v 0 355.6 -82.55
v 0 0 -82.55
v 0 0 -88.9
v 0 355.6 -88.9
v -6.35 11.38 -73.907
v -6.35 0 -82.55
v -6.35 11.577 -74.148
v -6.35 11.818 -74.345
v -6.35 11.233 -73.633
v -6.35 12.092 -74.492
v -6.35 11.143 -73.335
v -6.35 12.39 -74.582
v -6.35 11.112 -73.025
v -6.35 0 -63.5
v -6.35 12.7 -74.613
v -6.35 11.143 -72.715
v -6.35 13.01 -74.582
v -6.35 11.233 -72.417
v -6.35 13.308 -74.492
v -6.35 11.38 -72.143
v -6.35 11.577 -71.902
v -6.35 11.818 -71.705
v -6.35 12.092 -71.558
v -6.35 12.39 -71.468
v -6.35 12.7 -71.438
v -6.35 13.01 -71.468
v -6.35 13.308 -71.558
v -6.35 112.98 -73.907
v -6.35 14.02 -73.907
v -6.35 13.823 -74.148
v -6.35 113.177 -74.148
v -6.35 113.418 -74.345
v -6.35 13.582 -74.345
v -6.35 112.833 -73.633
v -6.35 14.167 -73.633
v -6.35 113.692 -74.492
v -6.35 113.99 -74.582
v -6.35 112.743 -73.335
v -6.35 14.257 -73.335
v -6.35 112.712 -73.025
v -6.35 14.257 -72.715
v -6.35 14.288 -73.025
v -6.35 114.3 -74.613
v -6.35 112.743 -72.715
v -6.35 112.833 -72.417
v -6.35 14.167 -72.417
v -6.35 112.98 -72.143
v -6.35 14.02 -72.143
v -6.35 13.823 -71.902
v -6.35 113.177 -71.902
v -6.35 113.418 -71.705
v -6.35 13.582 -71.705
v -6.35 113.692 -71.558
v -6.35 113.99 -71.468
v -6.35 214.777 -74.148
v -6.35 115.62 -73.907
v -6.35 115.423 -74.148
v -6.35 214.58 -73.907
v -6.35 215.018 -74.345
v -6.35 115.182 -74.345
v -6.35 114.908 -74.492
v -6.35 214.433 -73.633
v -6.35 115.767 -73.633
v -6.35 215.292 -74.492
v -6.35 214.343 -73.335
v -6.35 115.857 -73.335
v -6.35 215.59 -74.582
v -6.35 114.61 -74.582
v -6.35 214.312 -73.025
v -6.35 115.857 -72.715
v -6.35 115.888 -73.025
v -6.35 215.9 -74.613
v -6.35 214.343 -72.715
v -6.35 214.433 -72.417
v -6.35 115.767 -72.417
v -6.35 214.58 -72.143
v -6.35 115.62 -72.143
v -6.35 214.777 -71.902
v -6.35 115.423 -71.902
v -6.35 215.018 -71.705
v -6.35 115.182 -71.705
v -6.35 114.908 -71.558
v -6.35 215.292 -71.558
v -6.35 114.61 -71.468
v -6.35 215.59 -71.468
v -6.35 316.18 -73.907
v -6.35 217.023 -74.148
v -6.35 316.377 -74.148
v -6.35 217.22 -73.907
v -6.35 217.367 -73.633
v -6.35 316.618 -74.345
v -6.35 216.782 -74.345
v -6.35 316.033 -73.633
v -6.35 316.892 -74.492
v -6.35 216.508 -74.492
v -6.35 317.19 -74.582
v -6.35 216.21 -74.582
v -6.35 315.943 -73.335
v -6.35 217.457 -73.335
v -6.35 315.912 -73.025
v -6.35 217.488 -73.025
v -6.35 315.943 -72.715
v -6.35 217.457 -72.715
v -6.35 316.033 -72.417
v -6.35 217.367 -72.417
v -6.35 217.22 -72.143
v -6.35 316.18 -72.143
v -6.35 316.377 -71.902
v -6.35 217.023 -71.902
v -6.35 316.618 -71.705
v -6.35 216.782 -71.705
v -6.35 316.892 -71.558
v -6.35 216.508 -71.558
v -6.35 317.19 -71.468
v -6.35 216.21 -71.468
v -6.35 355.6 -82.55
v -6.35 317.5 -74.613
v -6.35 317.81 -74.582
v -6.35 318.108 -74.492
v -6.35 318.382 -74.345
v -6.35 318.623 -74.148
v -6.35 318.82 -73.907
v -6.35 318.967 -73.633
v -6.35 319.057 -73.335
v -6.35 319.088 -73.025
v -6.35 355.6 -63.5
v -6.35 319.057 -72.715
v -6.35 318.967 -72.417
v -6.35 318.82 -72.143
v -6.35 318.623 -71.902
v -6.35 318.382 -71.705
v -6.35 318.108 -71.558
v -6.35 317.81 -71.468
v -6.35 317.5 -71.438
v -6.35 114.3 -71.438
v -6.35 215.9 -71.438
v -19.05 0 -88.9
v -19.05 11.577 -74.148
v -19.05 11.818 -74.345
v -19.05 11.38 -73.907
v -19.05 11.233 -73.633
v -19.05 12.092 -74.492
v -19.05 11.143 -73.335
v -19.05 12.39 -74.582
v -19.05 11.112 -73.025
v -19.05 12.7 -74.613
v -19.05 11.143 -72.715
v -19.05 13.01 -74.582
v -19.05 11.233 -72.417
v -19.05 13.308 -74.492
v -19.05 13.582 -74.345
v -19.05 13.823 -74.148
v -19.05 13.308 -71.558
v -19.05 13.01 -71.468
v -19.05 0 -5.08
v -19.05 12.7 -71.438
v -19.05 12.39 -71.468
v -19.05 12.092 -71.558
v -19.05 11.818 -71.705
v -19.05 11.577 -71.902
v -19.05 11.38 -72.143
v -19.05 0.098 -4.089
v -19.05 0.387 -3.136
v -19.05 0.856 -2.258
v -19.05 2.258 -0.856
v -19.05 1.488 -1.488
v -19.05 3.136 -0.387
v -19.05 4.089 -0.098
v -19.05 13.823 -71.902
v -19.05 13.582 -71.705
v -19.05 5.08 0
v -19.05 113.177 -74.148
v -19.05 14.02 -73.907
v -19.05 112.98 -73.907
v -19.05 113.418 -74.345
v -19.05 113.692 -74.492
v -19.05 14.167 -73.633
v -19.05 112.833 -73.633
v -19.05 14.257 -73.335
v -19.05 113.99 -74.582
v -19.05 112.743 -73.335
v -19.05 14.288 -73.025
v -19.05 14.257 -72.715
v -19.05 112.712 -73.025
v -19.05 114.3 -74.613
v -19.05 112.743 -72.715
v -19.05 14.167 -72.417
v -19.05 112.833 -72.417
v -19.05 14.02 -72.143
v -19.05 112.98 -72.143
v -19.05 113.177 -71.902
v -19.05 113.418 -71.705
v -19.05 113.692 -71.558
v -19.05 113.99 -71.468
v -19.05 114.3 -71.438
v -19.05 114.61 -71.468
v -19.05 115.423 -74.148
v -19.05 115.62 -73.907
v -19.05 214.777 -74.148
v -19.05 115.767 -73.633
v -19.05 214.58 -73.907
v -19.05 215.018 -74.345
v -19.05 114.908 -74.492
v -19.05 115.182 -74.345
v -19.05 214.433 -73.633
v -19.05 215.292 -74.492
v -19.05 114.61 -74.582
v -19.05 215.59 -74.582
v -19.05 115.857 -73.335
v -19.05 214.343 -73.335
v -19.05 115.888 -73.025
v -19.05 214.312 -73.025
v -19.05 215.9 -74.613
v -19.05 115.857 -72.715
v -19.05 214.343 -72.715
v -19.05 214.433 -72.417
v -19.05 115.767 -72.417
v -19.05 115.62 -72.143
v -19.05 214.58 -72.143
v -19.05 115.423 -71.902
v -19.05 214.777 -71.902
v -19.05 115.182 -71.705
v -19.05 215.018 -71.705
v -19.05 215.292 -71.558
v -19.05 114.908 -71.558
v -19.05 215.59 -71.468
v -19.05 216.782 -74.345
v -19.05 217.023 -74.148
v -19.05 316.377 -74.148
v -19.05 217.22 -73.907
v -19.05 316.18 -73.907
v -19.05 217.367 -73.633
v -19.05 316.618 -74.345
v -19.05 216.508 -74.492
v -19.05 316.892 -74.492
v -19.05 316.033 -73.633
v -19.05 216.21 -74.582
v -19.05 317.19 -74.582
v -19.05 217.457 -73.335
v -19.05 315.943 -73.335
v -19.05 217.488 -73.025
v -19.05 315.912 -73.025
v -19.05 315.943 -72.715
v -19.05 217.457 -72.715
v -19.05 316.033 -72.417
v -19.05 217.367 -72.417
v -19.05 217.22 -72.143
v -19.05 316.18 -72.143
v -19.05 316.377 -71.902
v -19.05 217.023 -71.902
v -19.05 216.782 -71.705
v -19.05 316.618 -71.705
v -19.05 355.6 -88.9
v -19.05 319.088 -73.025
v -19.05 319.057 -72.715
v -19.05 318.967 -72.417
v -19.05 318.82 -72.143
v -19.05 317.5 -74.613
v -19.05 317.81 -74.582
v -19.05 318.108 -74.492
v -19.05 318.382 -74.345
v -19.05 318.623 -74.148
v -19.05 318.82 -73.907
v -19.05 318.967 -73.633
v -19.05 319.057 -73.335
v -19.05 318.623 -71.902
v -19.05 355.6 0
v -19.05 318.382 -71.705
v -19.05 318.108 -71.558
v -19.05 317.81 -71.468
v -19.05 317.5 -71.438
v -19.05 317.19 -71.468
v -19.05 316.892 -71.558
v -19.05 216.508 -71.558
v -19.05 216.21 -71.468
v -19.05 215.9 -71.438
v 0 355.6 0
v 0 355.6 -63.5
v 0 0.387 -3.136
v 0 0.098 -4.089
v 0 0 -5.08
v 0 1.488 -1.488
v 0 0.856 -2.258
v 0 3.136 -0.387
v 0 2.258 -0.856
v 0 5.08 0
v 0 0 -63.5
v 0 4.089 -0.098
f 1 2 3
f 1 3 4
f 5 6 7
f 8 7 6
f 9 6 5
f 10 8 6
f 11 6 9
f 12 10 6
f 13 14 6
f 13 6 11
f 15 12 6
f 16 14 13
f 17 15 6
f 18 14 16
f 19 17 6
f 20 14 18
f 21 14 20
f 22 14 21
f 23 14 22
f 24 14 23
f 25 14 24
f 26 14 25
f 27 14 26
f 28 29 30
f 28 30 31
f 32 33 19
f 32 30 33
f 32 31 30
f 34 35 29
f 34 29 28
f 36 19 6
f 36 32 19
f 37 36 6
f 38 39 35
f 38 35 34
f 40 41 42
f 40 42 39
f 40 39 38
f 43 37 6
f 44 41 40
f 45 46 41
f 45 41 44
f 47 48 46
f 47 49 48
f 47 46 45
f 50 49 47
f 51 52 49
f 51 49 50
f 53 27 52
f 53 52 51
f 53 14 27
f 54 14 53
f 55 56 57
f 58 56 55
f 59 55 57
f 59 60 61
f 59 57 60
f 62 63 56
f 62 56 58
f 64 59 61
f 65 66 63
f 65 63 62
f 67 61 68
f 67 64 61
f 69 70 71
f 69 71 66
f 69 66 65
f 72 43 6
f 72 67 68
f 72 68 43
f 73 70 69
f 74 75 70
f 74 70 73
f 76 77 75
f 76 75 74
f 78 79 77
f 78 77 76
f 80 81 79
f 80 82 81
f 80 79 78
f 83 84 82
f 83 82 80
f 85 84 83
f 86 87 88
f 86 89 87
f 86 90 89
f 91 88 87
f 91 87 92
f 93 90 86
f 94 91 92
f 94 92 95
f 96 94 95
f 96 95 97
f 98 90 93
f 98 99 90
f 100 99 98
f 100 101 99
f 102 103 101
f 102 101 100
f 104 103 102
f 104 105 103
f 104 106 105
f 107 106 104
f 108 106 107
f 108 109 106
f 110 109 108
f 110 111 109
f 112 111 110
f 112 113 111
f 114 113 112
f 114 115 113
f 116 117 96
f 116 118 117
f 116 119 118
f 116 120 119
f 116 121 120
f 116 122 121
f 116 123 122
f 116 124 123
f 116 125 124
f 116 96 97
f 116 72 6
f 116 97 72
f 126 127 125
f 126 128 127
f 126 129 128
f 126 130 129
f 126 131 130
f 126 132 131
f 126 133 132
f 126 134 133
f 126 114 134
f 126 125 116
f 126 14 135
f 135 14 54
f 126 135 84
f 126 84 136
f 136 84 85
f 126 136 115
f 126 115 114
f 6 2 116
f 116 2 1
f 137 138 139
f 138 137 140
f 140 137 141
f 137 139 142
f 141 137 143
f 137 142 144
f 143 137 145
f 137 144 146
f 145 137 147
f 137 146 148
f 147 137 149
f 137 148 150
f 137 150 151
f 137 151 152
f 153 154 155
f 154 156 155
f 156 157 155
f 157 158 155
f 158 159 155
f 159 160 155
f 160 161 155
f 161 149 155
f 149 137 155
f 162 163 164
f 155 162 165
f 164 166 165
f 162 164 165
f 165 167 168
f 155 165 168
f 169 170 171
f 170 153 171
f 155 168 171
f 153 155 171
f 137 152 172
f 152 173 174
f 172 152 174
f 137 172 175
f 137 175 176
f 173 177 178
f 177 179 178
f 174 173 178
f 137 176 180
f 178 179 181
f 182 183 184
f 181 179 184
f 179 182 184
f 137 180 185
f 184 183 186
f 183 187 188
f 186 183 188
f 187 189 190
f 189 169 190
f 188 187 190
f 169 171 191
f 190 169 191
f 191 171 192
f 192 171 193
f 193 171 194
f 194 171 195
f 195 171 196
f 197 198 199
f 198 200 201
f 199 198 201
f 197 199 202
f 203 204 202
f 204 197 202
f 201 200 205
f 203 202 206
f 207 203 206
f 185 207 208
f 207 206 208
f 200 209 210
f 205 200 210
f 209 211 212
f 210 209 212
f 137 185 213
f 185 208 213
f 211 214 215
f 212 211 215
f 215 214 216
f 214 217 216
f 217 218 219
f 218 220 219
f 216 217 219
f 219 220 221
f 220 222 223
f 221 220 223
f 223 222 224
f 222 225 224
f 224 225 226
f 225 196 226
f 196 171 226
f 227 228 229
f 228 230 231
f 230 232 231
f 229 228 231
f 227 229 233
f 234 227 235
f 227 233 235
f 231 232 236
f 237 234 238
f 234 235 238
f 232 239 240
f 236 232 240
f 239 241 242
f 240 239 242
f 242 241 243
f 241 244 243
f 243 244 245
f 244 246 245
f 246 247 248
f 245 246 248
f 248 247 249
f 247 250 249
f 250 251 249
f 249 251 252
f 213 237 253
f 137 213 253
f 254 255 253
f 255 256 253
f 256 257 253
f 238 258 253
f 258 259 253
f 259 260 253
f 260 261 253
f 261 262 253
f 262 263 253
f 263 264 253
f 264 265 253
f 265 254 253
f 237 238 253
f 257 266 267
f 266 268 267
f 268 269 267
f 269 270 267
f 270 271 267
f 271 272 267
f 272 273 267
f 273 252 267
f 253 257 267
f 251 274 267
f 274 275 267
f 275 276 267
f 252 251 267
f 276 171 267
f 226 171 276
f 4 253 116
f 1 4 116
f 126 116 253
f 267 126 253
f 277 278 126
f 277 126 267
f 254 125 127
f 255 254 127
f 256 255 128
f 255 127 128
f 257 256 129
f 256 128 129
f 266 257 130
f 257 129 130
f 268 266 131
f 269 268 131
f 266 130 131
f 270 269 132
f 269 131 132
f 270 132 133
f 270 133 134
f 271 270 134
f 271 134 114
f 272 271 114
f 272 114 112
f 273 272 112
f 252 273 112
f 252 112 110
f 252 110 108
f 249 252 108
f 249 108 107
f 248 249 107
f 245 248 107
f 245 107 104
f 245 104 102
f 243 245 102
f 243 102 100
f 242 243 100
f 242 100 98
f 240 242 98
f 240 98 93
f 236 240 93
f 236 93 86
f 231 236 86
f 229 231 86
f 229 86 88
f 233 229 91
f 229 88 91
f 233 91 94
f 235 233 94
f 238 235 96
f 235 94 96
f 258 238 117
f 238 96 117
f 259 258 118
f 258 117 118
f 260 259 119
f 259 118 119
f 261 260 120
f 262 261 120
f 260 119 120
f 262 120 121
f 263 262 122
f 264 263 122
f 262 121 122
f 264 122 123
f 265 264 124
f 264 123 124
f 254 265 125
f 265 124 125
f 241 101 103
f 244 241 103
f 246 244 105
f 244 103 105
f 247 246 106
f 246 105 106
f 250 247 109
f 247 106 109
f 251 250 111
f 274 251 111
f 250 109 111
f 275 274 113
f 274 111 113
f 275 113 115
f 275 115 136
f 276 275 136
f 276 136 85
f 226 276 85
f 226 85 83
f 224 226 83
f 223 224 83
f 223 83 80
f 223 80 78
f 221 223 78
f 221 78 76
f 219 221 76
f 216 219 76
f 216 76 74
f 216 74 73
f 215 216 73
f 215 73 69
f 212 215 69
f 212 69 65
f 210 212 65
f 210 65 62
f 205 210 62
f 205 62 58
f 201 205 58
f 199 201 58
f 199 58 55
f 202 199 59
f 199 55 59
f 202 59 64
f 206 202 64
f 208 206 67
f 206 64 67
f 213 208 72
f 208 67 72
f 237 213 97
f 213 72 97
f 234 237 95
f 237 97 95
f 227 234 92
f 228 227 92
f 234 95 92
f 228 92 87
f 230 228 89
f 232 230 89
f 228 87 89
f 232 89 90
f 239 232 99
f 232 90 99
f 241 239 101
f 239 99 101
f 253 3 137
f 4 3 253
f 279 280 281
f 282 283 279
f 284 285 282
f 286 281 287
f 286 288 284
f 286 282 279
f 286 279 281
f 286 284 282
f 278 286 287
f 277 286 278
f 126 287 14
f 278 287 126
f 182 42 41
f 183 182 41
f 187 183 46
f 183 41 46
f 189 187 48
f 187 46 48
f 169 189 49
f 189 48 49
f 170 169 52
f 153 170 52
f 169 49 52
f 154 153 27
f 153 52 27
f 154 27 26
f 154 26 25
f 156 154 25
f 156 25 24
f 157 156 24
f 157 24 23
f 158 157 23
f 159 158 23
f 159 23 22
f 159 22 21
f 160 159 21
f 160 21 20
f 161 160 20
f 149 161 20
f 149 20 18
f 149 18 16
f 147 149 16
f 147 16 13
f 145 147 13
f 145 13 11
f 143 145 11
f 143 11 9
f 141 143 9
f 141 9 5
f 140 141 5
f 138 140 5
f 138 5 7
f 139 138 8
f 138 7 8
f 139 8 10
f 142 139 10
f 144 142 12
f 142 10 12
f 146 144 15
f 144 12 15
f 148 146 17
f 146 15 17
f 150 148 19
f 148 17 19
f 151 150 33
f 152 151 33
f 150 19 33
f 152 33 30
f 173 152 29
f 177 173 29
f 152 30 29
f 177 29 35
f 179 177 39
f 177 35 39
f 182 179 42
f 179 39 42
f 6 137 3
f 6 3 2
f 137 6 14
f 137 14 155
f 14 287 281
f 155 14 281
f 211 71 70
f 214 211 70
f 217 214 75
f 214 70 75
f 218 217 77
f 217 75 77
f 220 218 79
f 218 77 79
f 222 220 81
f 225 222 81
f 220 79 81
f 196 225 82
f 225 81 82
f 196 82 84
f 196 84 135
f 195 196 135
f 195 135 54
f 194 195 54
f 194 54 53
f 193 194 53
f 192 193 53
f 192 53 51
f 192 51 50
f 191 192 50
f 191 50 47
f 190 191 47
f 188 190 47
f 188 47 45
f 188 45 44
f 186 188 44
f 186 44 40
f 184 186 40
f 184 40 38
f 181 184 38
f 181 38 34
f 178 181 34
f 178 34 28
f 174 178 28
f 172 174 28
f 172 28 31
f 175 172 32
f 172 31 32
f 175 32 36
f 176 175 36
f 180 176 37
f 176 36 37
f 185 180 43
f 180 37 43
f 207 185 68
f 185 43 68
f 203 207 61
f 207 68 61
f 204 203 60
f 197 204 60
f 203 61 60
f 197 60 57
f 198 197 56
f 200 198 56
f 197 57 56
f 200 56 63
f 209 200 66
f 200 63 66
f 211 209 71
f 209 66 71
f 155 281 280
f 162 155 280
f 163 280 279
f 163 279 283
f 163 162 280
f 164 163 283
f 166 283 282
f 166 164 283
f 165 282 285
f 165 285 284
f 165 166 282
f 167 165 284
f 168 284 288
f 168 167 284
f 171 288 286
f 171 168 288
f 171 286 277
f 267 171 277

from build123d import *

# Parameters (mm, degrees)
F0_W     = 355.6
F0_H     = 88.9
F1_DEPTH = 19.05
F2_W     = 355.6
F2_H     = 19.05
F3_DEPTH = 6.35
F4_R     = 5.08
F5_R     = 1.5875
F6_DEPTH = 19.051


with BuildPart() as f1:
    # F0 (on Right) → F1 (new body)
    with BuildSketch(Plane.YZ):
        with Locations((177.8, -44.45)):
            Rectangle(F0_W, F0_H)
    extrude(amount=-F1_DEPTH)

    # F2 (on Right) → F3 (cut)
    with BuildSketch(Plane.YZ):
        with Locations((177.8, -73.025)):
            Rectangle(F2_W, F2_H)
    extrude(amount=-F3_DEPTH, mode=Mode.SUBTRACT)

    # F4
    f4_edges = [f1.edges().sort_by_distance(p)[0] for p in [
        (-9.525, 0, 0),
    ]]
    fillet(f4_edges, radius=F4_R)

    # F5 (on Right) → F6 (cut, through all)
    with BuildSketch(Plane.YZ):
        with Locations((12.7, -73.025)):
            Circle(F5_R)
        with Locations((114.3, -73.025)):
            Circle(F5_R)
        with Locations((215.9, -73.025)):
            Circle(F5_R)
        with Locations((317.5, -73.025)):
            Circle(F5_R)
    extrude(amount=-F6_DEPTH, mode=Mode.SUBTRACT)


solid = f1.part
